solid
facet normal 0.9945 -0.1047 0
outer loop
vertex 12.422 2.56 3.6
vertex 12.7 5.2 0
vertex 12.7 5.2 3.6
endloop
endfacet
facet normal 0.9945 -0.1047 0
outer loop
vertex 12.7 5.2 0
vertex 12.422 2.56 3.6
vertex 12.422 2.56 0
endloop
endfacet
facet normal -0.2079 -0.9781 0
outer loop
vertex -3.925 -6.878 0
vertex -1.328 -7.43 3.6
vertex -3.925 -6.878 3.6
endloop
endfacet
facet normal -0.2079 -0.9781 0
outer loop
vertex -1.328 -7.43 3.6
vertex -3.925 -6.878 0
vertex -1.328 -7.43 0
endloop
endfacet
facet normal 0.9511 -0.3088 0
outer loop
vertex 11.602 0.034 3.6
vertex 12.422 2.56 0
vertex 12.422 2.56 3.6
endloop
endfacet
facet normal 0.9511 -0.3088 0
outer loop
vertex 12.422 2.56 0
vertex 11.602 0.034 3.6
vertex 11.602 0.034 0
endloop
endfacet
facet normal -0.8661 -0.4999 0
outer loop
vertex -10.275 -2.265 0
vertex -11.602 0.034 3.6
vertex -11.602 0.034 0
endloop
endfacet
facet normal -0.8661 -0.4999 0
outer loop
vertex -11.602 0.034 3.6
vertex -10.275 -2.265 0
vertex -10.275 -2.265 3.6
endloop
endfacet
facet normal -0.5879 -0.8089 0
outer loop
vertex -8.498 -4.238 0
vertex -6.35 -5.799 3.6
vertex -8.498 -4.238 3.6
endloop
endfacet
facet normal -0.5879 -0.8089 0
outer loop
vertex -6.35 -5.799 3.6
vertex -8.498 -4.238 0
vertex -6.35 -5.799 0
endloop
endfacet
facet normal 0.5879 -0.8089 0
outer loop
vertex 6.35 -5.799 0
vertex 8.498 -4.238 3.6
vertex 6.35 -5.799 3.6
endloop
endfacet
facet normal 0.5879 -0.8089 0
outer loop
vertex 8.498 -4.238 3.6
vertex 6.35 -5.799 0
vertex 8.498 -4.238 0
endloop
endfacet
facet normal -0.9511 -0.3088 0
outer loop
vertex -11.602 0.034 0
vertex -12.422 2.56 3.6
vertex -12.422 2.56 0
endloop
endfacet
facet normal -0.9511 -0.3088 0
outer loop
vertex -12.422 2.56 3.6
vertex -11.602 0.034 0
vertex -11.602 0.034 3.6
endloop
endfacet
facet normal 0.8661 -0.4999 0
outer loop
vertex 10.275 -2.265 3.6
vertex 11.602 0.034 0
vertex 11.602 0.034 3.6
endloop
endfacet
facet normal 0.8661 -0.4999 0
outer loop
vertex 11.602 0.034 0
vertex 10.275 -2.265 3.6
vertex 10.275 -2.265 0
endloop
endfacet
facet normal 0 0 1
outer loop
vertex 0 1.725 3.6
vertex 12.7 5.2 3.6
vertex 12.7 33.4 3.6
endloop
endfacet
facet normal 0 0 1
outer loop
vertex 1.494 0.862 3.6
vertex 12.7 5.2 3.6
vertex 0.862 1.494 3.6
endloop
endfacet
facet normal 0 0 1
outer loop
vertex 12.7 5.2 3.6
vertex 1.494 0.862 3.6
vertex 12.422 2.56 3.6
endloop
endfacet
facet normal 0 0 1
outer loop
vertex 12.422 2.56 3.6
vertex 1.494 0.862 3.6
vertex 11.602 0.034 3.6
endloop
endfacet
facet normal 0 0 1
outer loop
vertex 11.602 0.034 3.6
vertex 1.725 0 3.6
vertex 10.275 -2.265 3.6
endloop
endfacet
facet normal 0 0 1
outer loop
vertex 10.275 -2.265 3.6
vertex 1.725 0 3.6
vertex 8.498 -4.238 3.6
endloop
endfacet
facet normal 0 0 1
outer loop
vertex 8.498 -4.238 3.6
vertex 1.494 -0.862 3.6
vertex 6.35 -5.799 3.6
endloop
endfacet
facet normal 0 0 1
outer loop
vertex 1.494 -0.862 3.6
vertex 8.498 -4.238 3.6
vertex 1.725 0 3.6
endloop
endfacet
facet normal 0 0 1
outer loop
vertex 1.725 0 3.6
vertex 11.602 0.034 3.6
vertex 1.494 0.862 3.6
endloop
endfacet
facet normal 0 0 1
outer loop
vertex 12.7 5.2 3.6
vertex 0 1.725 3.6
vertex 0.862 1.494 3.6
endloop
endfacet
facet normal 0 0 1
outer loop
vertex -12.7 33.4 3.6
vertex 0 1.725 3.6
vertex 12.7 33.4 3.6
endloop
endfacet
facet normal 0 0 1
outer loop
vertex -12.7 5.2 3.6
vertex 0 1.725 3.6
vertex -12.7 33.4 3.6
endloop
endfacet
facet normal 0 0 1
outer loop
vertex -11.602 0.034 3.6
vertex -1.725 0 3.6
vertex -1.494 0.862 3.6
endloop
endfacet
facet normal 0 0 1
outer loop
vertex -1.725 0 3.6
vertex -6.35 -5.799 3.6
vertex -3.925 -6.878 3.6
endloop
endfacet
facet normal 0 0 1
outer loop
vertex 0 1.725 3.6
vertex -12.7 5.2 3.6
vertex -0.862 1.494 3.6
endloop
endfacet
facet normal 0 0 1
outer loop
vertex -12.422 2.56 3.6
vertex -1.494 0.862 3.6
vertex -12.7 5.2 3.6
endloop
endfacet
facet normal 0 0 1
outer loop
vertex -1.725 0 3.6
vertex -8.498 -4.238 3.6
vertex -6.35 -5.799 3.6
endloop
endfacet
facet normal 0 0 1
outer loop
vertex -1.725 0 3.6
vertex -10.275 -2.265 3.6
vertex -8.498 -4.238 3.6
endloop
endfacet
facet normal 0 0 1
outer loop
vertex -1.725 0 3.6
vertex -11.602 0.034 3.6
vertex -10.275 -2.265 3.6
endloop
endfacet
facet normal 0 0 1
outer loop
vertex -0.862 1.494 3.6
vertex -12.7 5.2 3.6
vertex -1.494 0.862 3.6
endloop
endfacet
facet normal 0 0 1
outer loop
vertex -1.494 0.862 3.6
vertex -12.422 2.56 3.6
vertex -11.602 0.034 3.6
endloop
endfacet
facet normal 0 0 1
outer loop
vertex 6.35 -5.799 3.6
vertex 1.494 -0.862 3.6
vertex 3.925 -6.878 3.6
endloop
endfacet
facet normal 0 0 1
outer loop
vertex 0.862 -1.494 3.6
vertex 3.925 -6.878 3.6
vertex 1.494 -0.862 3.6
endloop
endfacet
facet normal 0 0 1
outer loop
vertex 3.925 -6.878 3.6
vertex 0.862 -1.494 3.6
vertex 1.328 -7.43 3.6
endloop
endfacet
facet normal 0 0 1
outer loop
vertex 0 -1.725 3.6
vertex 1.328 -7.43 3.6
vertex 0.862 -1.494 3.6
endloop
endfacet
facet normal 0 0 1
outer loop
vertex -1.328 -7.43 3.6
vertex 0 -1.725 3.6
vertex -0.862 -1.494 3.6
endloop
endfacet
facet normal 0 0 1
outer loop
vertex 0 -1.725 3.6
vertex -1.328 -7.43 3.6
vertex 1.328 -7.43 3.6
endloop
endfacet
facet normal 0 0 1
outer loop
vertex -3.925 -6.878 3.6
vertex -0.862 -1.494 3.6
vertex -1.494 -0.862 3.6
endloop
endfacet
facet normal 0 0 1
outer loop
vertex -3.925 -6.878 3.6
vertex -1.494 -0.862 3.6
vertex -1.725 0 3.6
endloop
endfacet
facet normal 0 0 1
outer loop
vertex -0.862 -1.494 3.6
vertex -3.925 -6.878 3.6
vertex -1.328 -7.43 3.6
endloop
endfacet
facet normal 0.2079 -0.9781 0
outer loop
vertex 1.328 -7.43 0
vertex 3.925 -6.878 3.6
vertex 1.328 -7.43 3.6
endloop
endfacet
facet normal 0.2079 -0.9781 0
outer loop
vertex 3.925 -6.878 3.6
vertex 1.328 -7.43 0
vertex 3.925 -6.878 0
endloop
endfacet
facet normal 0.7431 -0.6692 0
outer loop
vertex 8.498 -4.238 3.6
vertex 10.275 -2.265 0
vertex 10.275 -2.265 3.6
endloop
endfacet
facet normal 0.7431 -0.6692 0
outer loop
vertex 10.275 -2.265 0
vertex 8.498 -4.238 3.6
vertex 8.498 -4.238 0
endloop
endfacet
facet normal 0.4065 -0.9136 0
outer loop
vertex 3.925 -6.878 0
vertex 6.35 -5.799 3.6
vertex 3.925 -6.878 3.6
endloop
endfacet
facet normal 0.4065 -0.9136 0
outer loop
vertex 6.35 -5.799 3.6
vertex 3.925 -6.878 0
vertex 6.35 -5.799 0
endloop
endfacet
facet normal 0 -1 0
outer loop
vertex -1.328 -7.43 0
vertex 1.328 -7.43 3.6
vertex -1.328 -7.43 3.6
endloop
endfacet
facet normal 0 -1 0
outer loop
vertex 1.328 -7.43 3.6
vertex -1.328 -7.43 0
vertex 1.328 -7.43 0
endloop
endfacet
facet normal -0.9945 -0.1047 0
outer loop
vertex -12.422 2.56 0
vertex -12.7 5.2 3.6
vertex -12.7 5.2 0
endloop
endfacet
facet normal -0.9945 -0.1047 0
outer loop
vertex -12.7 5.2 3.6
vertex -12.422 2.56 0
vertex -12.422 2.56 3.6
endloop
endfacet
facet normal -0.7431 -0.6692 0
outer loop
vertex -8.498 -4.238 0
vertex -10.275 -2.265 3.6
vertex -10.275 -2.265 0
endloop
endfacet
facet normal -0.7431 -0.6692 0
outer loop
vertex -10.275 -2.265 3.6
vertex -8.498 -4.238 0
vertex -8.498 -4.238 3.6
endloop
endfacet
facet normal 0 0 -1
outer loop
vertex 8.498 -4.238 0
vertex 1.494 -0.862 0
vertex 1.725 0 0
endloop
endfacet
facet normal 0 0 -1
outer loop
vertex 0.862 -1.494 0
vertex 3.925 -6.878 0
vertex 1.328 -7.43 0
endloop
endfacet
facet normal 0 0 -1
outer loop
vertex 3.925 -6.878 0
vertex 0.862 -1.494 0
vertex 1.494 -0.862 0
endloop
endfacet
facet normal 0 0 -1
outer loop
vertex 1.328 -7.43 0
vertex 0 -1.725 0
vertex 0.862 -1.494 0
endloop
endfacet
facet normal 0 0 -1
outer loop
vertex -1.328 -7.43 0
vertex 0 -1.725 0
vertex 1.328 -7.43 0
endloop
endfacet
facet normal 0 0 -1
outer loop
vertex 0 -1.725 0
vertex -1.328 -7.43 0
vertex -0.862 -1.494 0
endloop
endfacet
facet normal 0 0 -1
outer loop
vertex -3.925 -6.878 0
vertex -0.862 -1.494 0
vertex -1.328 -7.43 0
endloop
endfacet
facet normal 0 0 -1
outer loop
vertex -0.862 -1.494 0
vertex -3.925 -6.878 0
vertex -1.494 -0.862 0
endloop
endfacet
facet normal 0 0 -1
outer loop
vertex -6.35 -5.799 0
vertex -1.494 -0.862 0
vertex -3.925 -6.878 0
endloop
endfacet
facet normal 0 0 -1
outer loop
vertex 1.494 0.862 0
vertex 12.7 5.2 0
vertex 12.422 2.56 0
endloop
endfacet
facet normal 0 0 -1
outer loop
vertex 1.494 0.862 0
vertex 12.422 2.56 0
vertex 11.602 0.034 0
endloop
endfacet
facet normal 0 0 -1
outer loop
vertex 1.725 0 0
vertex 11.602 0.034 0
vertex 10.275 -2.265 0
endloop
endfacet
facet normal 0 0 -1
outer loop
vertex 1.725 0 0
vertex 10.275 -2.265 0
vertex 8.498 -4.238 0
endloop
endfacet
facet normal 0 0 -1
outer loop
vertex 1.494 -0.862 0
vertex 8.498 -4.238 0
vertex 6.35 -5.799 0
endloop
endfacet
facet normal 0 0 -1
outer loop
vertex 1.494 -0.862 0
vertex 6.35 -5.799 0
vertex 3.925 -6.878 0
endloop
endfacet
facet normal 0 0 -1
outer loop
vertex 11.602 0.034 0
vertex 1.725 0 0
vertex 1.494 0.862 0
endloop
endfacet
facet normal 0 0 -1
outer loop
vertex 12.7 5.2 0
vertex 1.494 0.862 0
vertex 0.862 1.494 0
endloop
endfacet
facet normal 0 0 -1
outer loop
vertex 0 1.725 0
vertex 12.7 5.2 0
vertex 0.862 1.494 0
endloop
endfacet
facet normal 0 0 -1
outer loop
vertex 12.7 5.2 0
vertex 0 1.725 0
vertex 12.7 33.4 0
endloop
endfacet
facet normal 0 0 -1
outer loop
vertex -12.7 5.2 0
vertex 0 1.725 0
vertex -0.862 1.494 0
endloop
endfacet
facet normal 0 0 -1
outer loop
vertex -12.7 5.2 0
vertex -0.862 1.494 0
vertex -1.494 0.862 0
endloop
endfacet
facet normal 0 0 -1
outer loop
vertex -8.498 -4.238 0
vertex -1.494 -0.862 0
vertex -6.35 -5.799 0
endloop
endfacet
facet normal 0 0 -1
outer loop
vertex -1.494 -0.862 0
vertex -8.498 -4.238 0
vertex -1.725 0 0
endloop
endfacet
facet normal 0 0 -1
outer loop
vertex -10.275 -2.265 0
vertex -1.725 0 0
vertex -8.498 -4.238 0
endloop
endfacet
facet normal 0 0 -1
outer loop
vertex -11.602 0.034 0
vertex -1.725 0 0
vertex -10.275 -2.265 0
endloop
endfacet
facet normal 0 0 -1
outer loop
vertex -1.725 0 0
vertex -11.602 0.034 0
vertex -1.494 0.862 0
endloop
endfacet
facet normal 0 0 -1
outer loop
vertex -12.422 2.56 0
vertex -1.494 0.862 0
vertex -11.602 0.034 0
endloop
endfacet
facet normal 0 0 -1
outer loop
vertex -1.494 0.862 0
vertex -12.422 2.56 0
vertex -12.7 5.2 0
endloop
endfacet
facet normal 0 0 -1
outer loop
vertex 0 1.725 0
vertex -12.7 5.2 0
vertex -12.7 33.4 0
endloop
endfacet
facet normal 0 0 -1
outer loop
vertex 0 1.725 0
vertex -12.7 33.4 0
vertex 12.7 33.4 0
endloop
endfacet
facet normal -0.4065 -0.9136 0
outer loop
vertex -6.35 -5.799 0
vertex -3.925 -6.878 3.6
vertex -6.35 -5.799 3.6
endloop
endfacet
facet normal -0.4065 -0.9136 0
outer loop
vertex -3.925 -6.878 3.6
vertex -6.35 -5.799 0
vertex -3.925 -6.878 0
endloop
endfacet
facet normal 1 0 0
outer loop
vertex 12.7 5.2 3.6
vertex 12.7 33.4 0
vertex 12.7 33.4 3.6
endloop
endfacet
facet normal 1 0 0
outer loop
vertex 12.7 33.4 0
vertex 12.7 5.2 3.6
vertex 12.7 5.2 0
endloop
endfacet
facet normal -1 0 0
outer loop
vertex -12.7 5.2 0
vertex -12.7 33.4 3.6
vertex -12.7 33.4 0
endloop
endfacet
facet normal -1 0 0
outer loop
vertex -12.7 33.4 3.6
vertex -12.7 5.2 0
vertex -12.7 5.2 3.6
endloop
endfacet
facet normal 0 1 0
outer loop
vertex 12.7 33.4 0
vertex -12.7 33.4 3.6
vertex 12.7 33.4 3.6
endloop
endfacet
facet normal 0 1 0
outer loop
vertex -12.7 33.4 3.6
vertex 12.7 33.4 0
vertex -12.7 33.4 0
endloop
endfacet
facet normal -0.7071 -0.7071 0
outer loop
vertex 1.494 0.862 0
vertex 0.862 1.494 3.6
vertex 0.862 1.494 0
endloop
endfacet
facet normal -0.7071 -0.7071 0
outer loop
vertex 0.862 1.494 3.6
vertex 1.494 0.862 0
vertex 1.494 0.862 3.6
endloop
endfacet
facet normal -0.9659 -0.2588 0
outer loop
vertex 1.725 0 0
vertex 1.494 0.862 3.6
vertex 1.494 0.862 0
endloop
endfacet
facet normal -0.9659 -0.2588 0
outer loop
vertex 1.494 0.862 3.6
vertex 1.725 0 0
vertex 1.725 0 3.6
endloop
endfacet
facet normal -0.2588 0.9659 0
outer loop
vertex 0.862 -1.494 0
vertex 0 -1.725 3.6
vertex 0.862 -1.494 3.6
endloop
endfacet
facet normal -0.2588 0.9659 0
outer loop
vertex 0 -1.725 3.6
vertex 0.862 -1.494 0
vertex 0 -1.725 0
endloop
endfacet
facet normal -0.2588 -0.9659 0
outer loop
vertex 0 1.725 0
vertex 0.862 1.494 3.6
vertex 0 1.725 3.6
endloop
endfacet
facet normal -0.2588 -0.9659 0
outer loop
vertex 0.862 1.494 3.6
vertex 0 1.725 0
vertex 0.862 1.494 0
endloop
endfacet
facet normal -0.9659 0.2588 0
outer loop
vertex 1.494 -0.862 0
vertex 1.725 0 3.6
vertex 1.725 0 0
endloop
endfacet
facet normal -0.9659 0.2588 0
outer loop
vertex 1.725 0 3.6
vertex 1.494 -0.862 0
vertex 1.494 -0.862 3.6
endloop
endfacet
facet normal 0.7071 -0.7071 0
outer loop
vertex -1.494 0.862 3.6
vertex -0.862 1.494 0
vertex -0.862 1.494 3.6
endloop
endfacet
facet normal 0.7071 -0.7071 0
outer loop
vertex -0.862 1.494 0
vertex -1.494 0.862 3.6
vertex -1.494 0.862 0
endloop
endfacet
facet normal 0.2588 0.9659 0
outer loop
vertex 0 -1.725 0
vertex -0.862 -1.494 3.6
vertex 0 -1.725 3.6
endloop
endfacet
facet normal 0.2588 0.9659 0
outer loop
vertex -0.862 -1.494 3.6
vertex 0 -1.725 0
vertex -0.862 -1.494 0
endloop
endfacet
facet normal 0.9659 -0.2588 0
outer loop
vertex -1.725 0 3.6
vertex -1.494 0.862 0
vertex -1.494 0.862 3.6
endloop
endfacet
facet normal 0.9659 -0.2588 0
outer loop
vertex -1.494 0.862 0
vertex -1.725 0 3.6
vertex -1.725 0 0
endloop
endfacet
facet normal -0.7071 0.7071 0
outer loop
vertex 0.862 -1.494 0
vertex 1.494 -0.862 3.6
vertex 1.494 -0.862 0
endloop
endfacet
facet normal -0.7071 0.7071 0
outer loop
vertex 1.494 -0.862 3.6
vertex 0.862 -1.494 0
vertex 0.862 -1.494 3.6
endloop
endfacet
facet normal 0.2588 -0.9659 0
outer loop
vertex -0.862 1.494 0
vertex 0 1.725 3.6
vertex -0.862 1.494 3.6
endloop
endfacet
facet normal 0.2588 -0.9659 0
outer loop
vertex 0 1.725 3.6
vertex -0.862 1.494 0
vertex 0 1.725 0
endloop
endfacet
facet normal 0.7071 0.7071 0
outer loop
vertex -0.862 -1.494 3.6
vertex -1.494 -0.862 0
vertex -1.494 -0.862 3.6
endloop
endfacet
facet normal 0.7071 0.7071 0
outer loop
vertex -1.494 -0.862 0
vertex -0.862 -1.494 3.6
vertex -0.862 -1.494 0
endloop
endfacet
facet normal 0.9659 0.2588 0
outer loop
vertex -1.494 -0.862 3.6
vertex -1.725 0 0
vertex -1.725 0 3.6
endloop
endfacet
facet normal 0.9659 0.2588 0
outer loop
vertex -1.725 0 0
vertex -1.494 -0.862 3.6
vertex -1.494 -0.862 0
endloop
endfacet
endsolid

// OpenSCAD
// file: ../include/configuration.scad
// Increase this if your slicer or printer make holes too tight.
extra_radius = 0.1;

// OD = outside diameter, corner to corner.
m3_nut_od = 6.1;
m3_nut_radius = m3_nut_od/2 + 0.2 + extra_radius;
m3_washer_radius = 3.5 + extra_radius;

// Major diameter of metric 3mm thread.
m3_major = 2.85;
m3_radius = m3_major/2 + extra_radius;
m3_wide_radius = m3_major/2 + extra_radius + 0.2;

// NEMA17 stepper motors.
motor_shaft_diameter = 5;
motor_shaft_radius = motor_shaft_diameter/2 + extra_radius;

// Frame brackets. M3x8mm screws work best with 3.6 mm brackets.
thickness = 3.6;

// OpenBeam or Misumi. Currently only 15x15 mm, but there is a plan
// to make models more parametric and allow 20x20 mm in the future.
extrusion = 15;

// Placement for the NEMA17 stepper motors.
motor_offset = 44;
motor_length = 47;
// main file
include <../include/configuration.scad>;

sticky_width = 25.4;
sticky_length = 25.4;
sticky_offset = 8;  // Distance from screw center to glass edge.

// Make the round edge line up with the outside of OpenBeam.
screw_offset = sticky_width/2 - 7.5;
cube_length = sticky_length + sticky_offset - screw_offset;

module glass_tab() {
  difference() {
    translate([0, screw_offset, 0]) union() {
      cylinder(r=sticky_width/2, h=thickness, center=true);
      translate([0, cube_length/2, 0])
        cube([sticky_width, cube_length, thickness], center=true);
    }
    cylinder(r=m3_wide_radius, h=20, center=true, $fn=12);
  }
  // Scotch restickable tab for mounting.
  translate([0, sticky_length/2+sticky_offset, thickness/2]) %
    cube([sticky_width, sticky_length, 0.7], center=true);
  // Horizontal OpenBeam.
  translate([0, 0, (15+thickness)/-2]) %
    cube([100, 15, 15], center=true);
}

translate([0, 0, thickness/2]) glass_tab();
